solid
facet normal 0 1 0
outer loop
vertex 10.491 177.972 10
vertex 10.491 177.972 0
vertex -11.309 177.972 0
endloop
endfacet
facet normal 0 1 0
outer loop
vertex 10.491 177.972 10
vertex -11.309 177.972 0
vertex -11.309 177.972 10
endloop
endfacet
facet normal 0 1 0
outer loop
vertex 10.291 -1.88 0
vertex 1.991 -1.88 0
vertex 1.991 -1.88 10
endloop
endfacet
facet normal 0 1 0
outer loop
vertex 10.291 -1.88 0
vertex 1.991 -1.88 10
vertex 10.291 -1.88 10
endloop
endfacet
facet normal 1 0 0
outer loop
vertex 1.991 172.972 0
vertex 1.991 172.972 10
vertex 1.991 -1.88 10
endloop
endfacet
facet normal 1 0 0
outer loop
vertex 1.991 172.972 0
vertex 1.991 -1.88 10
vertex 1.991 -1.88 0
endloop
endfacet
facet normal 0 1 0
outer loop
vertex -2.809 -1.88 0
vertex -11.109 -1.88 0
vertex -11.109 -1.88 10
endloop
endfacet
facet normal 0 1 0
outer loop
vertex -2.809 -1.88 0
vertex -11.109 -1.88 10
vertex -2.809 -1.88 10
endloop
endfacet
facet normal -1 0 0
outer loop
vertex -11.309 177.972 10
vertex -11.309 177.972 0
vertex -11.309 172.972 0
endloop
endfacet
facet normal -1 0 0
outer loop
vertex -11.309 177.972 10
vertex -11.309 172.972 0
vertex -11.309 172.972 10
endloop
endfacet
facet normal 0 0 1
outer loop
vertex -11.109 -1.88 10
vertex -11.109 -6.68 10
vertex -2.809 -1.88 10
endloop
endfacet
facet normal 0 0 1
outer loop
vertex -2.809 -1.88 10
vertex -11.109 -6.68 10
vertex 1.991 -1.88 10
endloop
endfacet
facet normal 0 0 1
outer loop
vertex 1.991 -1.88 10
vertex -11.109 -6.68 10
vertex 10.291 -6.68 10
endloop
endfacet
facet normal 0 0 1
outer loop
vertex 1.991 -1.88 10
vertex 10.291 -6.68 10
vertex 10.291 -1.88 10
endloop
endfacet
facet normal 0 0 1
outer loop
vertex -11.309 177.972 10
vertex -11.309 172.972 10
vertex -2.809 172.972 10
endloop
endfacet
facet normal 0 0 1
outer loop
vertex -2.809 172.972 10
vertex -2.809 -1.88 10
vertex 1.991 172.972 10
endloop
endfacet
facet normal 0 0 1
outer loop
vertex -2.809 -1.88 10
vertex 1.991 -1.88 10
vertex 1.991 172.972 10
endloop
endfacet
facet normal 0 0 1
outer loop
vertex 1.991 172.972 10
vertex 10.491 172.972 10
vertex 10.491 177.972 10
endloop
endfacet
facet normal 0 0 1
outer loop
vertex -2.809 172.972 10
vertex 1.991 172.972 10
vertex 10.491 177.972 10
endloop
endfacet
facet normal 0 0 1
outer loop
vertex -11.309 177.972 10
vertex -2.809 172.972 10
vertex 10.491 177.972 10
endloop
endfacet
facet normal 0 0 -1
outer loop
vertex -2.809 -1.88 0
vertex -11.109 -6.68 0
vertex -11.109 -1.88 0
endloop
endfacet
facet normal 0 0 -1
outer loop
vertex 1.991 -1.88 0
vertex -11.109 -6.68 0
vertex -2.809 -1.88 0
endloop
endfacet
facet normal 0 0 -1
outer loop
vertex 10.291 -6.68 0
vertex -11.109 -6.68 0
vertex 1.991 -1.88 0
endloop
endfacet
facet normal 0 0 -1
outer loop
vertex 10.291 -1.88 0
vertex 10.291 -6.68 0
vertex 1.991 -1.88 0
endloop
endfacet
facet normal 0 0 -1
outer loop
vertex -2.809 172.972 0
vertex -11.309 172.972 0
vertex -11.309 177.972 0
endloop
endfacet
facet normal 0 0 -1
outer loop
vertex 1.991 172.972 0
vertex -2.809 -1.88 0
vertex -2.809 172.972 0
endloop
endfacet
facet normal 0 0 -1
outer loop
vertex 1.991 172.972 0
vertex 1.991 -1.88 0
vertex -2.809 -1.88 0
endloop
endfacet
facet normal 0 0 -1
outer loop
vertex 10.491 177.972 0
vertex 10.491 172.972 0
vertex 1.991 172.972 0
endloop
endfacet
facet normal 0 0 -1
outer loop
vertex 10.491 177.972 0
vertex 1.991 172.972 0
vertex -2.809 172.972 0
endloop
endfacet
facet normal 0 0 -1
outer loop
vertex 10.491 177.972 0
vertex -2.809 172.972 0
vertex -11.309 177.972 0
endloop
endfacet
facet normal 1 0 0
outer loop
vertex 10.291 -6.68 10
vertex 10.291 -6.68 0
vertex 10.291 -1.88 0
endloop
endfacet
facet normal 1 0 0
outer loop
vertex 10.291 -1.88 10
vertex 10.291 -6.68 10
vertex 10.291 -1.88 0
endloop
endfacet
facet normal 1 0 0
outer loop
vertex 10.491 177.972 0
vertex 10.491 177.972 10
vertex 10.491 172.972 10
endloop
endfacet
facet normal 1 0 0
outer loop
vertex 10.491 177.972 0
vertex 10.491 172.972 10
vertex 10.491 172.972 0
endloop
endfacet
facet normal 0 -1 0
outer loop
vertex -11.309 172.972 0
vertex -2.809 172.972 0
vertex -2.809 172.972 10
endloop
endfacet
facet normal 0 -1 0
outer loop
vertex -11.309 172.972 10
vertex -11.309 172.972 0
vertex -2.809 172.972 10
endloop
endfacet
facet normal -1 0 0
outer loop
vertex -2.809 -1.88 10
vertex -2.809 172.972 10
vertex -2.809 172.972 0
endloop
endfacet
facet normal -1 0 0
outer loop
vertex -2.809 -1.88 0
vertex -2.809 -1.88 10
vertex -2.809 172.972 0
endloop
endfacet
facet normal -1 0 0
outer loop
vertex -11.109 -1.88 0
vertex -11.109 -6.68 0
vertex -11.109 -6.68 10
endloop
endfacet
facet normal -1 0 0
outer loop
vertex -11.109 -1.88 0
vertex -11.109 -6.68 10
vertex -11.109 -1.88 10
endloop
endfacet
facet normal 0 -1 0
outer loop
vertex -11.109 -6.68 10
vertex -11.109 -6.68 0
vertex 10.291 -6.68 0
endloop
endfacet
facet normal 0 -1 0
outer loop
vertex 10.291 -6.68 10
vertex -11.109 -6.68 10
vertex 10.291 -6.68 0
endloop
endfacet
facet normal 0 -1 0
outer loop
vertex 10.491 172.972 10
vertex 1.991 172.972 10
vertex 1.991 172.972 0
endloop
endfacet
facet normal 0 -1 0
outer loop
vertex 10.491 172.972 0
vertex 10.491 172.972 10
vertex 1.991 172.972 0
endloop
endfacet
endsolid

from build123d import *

# Parameters (mm, degrees)
SKETCH1_W           = 4.8
SKETCH1_H           = 2.351445648
SKETCH1_W_2         = 21.4
SKETCH1_H_2         = 4.8
BOSS_EXTRUDE1_DEPTH = 10
SKETCH2_W           = 4.8
SKETCH2_H           = 10
BOSS_EXTRUDE2_DEPTH = 177.5
SKETCH4_W           = 10
SKETCH4_H           = 5
BOSS_EXTRUDE6_DEPTH = 8.5
SKETCH8_W           = 10
SKETCH8_H           = 5
BOSS_EXTRUDE7_DEPTH = 8.5


with BuildPart() as part:
    # Sketch1 → Boss-Extrude1 (new body)
    with BuildSketch(Plane.XY):
        with Locations((-0.408910891, -0.704145163)):
            Rectangle(SKETCH1_W, SKETCH1_H)
        with Locations((-0.408910891, -4.279867987)):
            Rectangle(SKETCH1_W_2, SKETCH1_H_2)
    extrude(amount=BOSS_EXTRUDE1_DEPTH)

    # Sketch2 → Boss-Extrude2 (add)
    with BuildSketch(Plane(origin=(0, 0.471577661, 0), x_dir=(1, 0, 0), z_dir=(0, 1, 0))):
        with Locations((-0.408910891, -5)):
            Rectangle(SKETCH2_W, SKETCH2_H)
    extrude(amount=BOSS_EXTRUDE2_DEPTH)

    # Sketch4 → Boss-Extrude6 (add)
    with BuildSketch(Plane(origin=(1.991089109, 0, 0), x_dir=(0, 0, -1), z_dir=(1, 0, 0))):
        with Locations((-5, 175.471577661)):
            Rectangle(SKETCH4_W, SKETCH4_H)
    extrude(amount=BOSS_EXTRUDE6_DEPTH)

    # Sketch8 → Boss-Extrude7 (add)
    with BuildSketch(Plane.ZY.offset(2.808910891)):
        with Locations((5, 175.471577661)):
            Rectangle(SKETCH8_W, SKETCH8_H)
    extrude(amount=BOSS_EXTRUDE7_DEPTH)


solid = part.part
